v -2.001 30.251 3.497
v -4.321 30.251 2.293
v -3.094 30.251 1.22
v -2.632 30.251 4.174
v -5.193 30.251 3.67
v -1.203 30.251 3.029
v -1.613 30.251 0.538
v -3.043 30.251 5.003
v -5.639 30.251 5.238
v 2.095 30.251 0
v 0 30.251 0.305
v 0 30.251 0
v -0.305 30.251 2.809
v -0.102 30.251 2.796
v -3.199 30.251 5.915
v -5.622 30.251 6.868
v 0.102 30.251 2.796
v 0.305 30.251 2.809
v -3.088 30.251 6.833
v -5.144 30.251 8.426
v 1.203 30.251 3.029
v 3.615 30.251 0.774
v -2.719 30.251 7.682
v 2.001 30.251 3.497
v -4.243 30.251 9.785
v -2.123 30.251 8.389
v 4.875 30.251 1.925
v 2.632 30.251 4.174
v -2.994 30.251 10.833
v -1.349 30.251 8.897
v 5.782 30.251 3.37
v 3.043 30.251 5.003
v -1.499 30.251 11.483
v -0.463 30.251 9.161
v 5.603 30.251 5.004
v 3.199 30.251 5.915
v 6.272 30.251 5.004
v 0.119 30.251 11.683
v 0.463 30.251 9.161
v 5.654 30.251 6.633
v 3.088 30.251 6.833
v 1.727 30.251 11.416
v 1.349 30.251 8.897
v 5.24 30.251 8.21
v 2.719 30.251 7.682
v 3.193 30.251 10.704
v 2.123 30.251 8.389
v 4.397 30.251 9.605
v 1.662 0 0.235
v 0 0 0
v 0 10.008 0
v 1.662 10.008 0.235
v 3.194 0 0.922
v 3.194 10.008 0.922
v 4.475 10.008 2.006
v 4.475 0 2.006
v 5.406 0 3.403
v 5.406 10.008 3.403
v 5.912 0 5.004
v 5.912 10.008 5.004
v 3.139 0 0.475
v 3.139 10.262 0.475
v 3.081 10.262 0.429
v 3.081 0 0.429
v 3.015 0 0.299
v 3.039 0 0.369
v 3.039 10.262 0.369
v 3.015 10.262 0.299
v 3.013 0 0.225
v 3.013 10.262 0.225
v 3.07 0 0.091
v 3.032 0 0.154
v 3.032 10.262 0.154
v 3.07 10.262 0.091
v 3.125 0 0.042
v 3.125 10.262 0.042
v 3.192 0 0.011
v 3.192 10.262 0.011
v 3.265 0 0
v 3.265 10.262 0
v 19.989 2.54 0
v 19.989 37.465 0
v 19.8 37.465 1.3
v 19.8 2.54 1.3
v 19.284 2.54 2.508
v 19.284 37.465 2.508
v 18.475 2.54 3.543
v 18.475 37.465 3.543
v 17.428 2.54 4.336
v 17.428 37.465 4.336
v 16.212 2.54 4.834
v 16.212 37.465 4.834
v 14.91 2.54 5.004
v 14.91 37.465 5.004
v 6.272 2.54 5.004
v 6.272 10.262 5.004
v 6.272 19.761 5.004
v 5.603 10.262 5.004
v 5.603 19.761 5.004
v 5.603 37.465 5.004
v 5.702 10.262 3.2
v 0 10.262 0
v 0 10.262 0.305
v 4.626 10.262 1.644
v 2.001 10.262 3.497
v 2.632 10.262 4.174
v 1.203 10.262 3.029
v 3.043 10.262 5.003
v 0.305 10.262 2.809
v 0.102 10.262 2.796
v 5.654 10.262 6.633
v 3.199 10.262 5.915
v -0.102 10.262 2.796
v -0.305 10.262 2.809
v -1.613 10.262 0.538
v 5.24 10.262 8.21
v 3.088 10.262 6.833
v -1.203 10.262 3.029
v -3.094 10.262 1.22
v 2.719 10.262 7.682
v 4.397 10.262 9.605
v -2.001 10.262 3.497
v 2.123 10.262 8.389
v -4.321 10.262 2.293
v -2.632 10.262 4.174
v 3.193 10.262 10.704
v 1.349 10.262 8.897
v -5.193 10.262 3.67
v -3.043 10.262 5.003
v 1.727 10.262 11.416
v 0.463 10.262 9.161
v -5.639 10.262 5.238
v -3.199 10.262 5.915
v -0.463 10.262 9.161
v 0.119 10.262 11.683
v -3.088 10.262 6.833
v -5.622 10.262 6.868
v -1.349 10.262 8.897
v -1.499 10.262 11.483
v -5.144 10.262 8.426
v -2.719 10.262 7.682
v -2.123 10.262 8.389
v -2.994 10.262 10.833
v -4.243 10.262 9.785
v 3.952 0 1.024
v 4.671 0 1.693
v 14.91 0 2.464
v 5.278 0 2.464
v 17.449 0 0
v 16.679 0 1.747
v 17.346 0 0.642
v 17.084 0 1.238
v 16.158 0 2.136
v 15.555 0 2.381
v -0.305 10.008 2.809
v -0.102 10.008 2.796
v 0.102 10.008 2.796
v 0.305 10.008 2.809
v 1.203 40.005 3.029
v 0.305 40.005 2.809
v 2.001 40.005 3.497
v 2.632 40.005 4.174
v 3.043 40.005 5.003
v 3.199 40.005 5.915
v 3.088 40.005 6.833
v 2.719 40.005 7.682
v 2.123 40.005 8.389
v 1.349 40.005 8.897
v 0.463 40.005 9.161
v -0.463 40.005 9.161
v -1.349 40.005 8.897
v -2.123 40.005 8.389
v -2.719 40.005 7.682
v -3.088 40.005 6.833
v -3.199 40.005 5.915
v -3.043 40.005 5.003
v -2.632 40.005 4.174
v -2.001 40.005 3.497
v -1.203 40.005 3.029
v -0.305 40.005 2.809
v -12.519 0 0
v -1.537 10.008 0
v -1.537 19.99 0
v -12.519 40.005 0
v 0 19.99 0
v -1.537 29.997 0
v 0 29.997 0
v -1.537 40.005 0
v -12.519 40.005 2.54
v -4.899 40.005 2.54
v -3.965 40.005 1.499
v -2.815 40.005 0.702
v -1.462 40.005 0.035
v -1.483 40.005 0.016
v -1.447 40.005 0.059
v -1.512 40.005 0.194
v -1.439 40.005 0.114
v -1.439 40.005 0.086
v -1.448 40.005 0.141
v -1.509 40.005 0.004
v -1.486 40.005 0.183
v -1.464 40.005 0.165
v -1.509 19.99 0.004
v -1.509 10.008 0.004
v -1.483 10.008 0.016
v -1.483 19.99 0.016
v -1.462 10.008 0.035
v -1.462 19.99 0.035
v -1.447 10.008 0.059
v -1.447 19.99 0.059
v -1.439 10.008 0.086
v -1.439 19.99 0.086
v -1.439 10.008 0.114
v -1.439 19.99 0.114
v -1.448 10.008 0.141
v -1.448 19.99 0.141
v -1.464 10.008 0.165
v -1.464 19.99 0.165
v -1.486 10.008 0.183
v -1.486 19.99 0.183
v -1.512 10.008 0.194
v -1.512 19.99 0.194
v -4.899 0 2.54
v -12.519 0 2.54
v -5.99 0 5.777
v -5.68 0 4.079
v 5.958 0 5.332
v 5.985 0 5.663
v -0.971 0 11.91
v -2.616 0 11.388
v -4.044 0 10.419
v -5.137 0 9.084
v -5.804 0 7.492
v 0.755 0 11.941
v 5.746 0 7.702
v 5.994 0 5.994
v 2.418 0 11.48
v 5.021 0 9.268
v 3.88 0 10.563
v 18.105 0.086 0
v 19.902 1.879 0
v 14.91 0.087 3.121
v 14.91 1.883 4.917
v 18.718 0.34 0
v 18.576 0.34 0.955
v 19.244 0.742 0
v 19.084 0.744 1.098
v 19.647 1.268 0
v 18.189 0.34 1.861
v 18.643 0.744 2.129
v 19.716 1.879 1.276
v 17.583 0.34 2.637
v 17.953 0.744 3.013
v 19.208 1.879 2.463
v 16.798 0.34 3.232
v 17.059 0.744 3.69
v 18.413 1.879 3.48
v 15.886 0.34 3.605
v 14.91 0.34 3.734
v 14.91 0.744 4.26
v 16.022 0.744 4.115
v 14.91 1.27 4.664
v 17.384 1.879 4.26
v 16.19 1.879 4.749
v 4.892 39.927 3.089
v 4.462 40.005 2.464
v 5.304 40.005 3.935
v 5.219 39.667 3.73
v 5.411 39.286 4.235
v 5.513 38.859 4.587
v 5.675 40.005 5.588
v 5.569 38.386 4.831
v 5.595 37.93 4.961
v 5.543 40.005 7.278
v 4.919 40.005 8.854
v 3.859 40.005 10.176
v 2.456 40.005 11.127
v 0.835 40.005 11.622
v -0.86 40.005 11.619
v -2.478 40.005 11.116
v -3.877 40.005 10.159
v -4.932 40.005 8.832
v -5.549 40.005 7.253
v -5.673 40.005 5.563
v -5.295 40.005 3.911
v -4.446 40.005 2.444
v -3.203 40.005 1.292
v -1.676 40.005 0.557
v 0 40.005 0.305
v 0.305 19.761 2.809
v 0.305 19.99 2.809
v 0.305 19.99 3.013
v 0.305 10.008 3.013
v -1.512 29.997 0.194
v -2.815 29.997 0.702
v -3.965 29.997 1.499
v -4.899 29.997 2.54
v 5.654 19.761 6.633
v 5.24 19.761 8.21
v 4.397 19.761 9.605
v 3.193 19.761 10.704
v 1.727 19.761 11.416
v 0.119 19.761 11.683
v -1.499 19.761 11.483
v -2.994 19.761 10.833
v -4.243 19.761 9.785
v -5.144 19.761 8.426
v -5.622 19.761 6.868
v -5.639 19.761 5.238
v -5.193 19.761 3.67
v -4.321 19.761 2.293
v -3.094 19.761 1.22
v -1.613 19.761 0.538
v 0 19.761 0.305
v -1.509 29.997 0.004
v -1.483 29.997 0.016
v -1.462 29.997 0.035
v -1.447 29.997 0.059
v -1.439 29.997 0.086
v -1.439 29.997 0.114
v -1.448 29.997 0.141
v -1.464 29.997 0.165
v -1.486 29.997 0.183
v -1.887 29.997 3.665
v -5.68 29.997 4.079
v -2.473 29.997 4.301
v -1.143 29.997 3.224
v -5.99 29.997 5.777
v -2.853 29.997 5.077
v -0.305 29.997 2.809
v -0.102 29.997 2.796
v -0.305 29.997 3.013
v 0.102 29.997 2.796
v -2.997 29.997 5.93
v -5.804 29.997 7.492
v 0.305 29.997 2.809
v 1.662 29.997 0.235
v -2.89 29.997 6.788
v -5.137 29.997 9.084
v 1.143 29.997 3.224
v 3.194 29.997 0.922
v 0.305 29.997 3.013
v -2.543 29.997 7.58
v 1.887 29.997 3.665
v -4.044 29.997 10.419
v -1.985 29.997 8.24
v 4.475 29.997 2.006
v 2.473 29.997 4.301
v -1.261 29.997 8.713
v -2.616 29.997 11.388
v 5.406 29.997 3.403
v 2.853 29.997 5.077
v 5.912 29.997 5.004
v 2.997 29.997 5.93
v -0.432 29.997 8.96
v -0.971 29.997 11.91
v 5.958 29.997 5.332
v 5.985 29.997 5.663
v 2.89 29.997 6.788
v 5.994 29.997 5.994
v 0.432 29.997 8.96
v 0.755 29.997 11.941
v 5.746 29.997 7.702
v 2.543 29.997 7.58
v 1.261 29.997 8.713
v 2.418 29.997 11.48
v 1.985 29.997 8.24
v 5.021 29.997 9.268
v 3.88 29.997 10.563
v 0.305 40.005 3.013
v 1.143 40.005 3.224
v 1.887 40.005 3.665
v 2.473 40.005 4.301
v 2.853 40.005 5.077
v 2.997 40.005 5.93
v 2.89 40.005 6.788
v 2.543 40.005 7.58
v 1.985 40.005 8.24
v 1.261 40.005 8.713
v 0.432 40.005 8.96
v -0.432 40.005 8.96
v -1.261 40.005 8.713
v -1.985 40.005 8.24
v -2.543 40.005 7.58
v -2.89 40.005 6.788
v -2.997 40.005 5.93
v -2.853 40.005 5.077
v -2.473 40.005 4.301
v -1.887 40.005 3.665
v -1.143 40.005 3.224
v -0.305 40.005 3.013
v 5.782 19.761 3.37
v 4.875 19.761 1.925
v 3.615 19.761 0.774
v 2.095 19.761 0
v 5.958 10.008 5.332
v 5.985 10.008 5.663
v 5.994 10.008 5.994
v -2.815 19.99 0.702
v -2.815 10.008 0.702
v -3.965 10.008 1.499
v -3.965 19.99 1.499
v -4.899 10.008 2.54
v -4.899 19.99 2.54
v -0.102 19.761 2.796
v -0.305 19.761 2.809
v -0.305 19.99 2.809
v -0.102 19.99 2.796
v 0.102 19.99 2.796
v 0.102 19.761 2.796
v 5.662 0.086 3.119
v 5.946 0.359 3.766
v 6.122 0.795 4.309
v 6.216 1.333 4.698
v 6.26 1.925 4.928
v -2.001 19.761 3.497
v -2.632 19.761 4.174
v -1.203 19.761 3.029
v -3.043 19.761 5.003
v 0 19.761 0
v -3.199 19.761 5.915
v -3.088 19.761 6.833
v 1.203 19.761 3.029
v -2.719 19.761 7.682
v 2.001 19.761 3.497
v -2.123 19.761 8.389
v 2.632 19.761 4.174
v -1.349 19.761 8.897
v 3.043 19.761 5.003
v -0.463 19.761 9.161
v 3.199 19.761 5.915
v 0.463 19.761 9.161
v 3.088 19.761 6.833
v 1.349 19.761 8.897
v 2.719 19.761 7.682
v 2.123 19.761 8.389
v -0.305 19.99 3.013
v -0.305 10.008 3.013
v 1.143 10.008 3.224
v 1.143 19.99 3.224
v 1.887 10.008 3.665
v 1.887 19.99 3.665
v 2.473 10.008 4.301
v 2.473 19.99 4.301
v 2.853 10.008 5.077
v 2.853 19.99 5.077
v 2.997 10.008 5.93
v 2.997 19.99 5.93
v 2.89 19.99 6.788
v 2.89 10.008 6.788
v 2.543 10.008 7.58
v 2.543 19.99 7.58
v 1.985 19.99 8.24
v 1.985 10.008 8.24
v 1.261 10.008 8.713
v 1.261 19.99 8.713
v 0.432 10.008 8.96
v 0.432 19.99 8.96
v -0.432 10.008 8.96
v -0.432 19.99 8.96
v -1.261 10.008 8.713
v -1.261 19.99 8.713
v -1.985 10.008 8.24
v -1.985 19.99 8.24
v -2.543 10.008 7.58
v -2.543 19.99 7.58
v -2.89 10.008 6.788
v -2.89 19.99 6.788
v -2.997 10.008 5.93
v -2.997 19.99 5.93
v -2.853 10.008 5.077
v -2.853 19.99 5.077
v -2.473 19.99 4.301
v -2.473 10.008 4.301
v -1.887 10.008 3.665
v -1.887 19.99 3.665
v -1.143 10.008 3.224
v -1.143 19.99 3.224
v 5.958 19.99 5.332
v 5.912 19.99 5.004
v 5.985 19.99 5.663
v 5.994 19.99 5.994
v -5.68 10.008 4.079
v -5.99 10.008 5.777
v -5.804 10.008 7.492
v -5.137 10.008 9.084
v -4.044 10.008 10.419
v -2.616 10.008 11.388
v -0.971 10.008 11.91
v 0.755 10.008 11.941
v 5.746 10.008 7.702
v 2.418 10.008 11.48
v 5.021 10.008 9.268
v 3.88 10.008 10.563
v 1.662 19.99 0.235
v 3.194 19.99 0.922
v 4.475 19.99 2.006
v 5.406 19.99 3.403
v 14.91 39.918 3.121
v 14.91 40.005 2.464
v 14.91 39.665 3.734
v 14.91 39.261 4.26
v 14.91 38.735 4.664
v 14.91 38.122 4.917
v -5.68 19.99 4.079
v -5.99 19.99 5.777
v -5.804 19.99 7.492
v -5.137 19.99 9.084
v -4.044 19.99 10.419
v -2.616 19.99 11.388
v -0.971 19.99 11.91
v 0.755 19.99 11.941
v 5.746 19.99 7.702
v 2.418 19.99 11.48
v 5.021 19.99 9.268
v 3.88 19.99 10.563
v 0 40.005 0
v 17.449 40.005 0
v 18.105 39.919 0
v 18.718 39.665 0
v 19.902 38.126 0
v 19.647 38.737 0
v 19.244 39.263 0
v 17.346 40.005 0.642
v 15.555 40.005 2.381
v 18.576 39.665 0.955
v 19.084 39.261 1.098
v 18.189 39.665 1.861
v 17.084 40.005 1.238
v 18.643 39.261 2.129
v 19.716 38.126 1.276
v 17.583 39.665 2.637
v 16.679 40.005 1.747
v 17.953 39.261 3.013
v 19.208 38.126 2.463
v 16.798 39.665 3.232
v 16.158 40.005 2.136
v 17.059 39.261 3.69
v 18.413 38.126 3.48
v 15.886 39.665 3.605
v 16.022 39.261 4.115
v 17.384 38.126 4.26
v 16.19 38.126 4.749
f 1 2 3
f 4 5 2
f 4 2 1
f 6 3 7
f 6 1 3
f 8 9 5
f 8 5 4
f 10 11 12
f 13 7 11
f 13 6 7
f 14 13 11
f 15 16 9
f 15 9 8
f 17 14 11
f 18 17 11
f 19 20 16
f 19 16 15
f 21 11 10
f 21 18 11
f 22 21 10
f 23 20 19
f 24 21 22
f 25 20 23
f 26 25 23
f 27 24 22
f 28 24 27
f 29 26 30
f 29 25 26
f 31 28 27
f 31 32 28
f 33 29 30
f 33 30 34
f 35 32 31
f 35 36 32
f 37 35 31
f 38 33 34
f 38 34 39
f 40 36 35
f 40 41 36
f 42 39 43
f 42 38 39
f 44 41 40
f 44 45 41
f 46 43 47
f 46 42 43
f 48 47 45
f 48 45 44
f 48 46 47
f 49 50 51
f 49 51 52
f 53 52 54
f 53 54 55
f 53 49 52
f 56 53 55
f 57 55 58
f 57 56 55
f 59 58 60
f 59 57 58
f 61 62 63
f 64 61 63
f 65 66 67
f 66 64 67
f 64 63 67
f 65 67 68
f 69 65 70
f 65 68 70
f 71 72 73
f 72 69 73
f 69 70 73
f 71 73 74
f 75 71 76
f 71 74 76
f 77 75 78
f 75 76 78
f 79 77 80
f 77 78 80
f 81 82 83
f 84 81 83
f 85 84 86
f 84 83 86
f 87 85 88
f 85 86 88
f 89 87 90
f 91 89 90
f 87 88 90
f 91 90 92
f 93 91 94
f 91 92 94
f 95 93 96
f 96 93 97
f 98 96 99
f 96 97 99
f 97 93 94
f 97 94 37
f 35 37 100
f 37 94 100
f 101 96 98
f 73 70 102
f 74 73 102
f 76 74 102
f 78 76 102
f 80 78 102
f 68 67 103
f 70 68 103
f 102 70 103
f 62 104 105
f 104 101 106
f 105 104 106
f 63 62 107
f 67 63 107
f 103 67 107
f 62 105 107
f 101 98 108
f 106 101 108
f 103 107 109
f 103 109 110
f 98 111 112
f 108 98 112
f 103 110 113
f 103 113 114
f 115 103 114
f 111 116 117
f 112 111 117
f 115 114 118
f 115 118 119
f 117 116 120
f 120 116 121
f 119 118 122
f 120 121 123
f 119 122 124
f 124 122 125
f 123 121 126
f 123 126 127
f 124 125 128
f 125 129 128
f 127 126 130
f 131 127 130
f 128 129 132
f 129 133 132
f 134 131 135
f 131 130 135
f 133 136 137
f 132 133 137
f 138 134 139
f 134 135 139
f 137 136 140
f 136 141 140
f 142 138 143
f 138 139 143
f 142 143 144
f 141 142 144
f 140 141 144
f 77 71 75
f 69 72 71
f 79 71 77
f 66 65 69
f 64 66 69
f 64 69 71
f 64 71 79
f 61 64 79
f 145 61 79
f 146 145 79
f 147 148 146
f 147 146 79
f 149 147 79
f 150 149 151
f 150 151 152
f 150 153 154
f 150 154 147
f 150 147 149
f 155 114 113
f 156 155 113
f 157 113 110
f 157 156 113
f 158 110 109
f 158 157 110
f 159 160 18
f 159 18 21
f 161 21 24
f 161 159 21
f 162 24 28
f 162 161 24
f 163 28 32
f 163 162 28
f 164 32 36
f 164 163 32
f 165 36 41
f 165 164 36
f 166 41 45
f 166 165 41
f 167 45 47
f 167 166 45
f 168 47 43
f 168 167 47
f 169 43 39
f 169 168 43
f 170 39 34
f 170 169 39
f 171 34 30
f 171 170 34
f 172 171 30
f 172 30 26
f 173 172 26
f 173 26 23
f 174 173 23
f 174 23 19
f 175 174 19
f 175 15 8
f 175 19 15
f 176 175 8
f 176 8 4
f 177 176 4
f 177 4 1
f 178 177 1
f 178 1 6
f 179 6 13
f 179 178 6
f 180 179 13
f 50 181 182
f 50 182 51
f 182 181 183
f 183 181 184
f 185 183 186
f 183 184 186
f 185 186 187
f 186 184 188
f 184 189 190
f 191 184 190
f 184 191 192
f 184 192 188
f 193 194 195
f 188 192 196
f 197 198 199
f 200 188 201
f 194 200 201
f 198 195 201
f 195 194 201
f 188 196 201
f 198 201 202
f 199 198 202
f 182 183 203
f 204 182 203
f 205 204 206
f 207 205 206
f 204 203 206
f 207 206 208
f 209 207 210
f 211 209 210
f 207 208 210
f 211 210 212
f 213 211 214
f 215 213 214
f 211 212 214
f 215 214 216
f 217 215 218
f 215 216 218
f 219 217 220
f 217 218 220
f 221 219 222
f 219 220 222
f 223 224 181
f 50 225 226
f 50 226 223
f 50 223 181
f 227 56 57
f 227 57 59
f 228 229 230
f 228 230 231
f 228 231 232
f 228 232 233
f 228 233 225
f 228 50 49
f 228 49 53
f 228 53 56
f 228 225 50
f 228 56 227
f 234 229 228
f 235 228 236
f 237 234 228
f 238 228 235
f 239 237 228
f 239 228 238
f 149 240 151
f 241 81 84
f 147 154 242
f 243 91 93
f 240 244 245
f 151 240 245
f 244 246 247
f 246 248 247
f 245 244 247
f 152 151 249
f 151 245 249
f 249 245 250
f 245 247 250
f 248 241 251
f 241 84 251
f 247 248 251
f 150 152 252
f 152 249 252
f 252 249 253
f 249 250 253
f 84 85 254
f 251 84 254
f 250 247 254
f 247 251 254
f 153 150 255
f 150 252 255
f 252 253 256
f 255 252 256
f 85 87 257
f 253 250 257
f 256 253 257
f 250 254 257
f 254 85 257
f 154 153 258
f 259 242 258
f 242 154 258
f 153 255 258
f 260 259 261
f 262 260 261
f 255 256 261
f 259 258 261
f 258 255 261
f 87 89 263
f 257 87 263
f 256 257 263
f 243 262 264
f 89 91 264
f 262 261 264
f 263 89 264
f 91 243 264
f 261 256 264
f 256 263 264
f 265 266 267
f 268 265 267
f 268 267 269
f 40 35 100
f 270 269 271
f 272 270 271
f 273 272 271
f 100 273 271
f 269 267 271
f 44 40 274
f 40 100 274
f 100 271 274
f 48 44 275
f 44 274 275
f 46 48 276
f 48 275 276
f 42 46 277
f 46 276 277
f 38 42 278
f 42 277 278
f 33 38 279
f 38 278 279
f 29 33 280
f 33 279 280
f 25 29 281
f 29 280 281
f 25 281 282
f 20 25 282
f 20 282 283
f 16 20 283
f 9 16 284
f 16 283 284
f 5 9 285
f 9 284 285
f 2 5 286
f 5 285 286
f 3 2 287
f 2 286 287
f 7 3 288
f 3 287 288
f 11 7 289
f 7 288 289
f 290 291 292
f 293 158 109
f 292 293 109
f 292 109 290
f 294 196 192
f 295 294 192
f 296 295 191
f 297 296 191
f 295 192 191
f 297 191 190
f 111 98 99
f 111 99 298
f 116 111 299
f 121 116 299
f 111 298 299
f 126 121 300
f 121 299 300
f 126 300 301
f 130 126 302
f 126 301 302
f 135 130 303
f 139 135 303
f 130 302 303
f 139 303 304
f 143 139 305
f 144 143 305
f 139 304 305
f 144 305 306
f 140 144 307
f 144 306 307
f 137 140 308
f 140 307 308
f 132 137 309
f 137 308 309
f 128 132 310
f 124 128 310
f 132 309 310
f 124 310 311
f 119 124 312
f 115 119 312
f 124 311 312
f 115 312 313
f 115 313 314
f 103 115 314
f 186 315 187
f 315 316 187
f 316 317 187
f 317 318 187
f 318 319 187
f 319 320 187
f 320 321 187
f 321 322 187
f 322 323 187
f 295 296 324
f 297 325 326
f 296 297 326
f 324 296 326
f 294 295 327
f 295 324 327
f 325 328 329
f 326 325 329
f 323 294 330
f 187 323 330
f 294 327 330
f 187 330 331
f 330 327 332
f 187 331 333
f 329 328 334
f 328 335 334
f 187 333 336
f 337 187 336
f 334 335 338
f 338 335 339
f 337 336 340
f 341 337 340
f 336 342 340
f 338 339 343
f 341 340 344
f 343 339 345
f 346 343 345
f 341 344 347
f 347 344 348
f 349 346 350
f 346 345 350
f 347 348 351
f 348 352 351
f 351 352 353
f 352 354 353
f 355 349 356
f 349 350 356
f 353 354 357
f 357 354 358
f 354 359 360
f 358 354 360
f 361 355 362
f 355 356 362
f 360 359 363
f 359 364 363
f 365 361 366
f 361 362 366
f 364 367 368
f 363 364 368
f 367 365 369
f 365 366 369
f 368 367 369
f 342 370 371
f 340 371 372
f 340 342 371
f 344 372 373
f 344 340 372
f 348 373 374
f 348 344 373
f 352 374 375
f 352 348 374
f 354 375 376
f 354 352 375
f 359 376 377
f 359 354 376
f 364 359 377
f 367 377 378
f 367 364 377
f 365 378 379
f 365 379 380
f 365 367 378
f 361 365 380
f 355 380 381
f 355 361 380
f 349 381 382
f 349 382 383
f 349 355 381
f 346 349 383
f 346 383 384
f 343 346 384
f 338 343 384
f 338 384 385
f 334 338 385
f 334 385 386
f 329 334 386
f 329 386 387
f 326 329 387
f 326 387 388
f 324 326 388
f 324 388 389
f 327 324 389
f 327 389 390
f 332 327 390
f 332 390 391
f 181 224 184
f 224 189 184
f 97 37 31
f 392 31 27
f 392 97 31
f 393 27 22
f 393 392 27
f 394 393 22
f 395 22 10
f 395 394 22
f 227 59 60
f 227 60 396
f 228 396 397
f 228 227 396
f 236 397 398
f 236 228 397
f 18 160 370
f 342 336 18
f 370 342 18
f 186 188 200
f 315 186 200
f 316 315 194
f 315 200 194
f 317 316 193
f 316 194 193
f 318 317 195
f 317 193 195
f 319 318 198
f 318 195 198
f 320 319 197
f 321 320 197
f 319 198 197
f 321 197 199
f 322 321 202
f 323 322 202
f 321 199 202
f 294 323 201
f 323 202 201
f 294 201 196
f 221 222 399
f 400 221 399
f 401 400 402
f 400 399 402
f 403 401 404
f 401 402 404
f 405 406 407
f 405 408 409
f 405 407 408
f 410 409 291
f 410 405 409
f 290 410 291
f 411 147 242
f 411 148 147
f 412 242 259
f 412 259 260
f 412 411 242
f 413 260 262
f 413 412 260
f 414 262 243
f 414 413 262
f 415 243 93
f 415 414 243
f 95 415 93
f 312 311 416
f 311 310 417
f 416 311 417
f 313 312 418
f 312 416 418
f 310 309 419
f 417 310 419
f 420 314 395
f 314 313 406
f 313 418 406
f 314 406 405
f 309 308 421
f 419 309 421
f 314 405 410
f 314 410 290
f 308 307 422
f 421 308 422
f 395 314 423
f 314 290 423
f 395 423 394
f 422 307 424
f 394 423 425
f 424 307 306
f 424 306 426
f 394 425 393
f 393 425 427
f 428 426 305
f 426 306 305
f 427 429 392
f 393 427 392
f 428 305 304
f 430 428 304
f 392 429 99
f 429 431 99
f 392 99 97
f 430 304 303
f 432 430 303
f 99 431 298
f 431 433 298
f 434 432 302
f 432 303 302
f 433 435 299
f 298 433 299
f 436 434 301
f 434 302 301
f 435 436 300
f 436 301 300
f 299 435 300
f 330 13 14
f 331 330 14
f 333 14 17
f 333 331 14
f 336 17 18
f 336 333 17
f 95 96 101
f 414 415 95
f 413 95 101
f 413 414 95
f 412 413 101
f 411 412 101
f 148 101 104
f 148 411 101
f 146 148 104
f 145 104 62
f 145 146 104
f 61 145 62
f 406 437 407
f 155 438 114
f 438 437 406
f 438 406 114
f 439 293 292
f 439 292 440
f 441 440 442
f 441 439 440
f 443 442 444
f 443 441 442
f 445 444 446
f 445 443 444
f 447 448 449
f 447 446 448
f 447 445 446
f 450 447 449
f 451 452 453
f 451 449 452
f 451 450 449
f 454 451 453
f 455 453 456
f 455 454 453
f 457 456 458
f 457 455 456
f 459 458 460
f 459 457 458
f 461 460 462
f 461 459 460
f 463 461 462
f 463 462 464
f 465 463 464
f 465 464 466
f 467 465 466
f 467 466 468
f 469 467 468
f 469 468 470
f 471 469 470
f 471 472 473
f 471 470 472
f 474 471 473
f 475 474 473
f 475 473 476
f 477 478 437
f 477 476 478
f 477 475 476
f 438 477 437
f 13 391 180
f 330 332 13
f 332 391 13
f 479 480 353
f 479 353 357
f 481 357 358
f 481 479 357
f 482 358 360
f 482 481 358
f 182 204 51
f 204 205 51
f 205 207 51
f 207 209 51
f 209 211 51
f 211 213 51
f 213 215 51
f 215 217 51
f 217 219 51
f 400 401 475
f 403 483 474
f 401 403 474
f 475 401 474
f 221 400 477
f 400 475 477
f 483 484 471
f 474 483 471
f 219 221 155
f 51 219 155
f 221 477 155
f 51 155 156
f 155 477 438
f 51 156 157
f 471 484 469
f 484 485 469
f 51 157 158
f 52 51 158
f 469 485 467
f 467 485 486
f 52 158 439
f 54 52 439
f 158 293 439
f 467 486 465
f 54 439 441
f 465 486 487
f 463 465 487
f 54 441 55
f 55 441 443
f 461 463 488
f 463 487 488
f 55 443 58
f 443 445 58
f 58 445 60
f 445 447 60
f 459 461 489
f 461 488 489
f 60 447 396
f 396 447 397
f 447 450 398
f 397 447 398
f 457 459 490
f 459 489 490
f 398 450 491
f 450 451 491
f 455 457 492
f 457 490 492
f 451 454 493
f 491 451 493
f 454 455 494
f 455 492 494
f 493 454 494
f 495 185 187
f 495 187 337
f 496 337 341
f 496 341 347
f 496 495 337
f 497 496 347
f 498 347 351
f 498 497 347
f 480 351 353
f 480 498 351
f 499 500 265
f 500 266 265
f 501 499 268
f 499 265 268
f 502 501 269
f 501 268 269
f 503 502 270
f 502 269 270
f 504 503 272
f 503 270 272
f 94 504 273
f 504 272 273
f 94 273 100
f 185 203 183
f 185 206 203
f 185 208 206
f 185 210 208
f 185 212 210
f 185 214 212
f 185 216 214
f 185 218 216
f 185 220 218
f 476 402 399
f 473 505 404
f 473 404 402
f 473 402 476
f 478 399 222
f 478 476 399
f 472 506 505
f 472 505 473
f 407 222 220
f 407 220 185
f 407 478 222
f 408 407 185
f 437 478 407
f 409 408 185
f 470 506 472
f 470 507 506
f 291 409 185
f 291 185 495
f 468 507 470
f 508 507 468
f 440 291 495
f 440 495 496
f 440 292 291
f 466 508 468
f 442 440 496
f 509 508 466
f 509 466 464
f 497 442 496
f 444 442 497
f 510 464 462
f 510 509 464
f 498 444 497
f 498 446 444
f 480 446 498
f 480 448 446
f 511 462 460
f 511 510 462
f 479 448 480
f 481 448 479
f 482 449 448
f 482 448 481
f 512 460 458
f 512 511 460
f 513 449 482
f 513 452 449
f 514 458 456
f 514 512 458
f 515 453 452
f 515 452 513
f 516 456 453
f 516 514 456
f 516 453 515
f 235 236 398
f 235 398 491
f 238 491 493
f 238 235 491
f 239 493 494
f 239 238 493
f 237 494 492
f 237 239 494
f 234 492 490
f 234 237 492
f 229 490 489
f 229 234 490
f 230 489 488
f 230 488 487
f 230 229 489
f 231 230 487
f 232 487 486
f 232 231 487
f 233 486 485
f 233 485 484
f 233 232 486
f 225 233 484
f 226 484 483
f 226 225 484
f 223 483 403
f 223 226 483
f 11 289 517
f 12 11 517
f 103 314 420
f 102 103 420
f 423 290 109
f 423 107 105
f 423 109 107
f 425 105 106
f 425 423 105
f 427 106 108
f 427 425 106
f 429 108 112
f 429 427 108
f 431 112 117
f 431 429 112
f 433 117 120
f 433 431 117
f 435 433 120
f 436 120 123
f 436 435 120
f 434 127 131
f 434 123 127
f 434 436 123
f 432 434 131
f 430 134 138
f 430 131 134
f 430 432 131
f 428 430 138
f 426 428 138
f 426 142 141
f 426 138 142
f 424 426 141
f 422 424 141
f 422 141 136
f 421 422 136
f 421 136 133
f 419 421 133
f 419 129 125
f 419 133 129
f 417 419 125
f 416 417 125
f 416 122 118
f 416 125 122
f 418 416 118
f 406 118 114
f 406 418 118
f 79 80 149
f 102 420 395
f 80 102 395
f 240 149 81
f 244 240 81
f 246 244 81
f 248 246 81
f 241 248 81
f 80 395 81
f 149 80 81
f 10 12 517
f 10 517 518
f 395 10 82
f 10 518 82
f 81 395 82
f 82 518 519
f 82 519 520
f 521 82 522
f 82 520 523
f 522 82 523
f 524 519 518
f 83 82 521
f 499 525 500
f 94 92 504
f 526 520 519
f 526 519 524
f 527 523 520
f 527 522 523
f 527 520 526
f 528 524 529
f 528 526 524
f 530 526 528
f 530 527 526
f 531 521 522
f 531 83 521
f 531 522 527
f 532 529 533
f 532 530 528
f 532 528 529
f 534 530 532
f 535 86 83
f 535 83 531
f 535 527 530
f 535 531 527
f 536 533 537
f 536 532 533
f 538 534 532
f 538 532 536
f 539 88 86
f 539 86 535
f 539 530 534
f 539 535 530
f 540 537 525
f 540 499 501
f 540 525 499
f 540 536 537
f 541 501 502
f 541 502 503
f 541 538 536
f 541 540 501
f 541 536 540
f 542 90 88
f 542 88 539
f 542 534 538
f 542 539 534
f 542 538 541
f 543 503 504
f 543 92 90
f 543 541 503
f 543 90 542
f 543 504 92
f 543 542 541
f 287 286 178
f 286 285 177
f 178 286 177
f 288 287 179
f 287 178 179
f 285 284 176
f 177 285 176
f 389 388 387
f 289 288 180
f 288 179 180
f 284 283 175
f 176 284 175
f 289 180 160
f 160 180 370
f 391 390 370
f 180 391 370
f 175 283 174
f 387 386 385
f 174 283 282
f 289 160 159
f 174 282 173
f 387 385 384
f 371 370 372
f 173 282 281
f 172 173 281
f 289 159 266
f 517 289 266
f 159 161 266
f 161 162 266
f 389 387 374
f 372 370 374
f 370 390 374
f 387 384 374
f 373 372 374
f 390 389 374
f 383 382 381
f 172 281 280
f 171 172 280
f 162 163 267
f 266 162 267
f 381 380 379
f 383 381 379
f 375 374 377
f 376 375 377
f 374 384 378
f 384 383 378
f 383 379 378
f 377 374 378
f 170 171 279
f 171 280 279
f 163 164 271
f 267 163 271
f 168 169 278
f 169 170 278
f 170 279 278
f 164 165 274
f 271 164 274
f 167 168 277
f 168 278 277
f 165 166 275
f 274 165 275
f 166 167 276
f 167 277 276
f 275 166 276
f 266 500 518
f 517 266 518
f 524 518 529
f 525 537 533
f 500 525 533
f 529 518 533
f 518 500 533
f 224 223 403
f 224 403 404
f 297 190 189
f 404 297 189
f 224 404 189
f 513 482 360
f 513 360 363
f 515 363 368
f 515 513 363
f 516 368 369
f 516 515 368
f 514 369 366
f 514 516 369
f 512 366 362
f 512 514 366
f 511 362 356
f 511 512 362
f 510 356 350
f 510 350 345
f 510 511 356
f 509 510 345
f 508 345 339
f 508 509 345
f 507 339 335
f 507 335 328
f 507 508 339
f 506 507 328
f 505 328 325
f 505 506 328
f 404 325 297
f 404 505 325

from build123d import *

# Parameters (mm, degrees)
F3_DEPTH     = 10.0076
F4_DEPTH     = 40.005
F6_START     = -19.9898
F6_DEPTH     = 10.0076
F7_DEPTH     = 10.0076
F9_START     = 20.2438
F2_R         = 3.2004
F9_DEPTH     = 9.4996
F10_DEPTH    = 10.2616
F11_START    = 20.0152
F11_DEPTH    = 9.9822
F12_START    = -19.7612
F12_DEPTH    = 11.6078
F13_DEPTH    = 9.7536
F14_T1_DEPTH = 13.1863686745
F15_T1_DEPTH = 65.405
F16_R        = 2.54


# Not quite as in the source:
# - a fillet or chamfer that OpenCascade refuses, or shapes differently, is made with other operations: its cross-section is extruded or revolved along the edge and cut away or added


with BuildPart() as f3:
    # F0 (on Front) → F3 (new body)
    with BuildSketch(Plane.XZ):
        with BuildLine():
            ThreePointArc((-4.8989745866, 2.54), (-2.7591462448, 0.6727514434), (0, 0))
            ThreePointArc((0, 0), (3.8726462994, 1.4188735822), (5.9119830007, 5.0038))
            ThreePointArc((5.9119830007, 5.0038), (5.9737602169, 5.4973887019), (5.9944, 5.9944))
            ThreePointArc((5.9944, 5.9944), (-1.8119627615, 11.7083848014), (-4.8989745866, 2.54))
        make_face()
        with BuildLine():
            ThreePointArc((-0.3048, 3.0127385839), (0, 8.9916), (0.3048, 3.0127385839))
            Line((0.3048, 3.0127385839), (0.3048, 2.808547348))
            ThreePointArc((0.3048, 2.808547348), (0, 2.794), (-0.3048, 2.808547348))
            Line((-0.3048, 2.808547348), (-0.3048, 3.0127385839))
        make_face(mode=Mode.SUBTRACT)
        with BuildLine():
            Line((-12.5189745866, 0), (0, 0))
            ThreePointArc((0, 0), (-2.7591462448, 0.6727514434), (-4.8989745866, 2.54))
            Line((-4.8989745866, 2.54), (-12.5189745866, 2.54))
            Line((-12.5189745866, 2.54), (-12.5189745866, 0))
        make_face()
    extrude(amount=-F3_DEPTH)

    # F0 (on Front) → F4 (join)
    with BuildSketch(Plane.XZ):
        with BuildLine():
            Line((0.3048, 2.808547348), (0.3048, 3.0127385839))
            ThreePointArc((0.3048, 3.0127385839), (0, 8.9916), (-0.3048, 3.0127385839))
            Line((-0.3048, 3.0127385839), (-0.3048, 2.808547348))
            ThreePointArc((-0.3048, 2.808547348), (0, 2.794), (0.3048, 2.808547348))
        make_face()
    extrude(amount=-F4_DEPTH)

    # F0 (on Front) → F6 (join)
    with BuildSketch(Plane.XZ.offset(F6_START)):
        with BuildLine():
            ThreePointArc((-4.8989745866, 2.54), (-2.7591462448, 0.6727514434), (0, 0))
            ThreePointArc((0, 0), (3.8726462994, 1.4188735822), (5.9119830007, 5.0038))
            ThreePointArc((5.9119830007, 5.0038), (5.9737602169, 5.4973887019), (5.9944, 5.9944))
            ThreePointArc((5.9944, 5.9944), (-1.8119627615, 11.7083848014), (-4.8989745866, 2.54))
        make_face()
        with BuildLine():
            ThreePointArc((-0.3048, 3.0127385839), (0, 8.9916), (0.3048, 3.0127385839))
            Line((0.3048, 3.0127385839), (0.3048, 2.808547348))
            ThreePointArc((0.3048, 2.808547348), (0, 2.794), (-0.3048, 2.808547348))
            Line((-0.3048, 2.808547348), (-0.3048, 3.0127385839))
        make_face(mode=Mode.SUBTRACT)
        with BuildLine():
            Line((-12.5189745866, 0), (0, 0))
            ThreePointArc((0, 0), (-2.7591462448, 0.6727514434), (-4.8989745866, 2.54))
            Line((-4.8989745866, 2.54), (-12.5189745866, 2.54))
            Line((-12.5189745866, 2.54), (-12.5189745866, 0))
        make_face()
    extrude(amount=-F6_DEPTH)

    # F2 (on offset) → F7 (join)
    with BuildSketch(Plane.XZ.offset(-40.005)):
        with BuildLine():
            ThreePointArc((-1.5118372742, 0.1937811178), (-3.4133287183, 1.0667211934), (-4.8989745866, 2.54))
            Line((-4.8989745866, 2.54), (-12.5189745866, 2.54))
            Line((-12.5189745866, 2.54), (-12.5189745866, 0))
            Line((-12.5189745866, 0), (-1.5366753453, 0))
            ThreePointArc((-1.5366753453, 0), (-1.4389921182, 0.0859617436), (-1.5118372742, 0.1937811178))
        make_face()
    extrude(amount=F7_DEPTH)

    # F2 (on offset) → F9 (join)
    with BuildSketch(Plane.XZ.offset(-40.005).offset(F9_START)):
        with BuildLine():
            Line((0, 0.3048), (0, 0))
            ThreePointArc((0, 0), (3.8726462994, 1.4188735822), (5.9119830007, 5.0038))
            Line((5.9119830007, 5.0038), (5.6027011164, 5.0038))
            ThreePointArc((5.6027011164, 5.0038), (-3.6561886166, 10.353738592), (0, 0.3048))
        make_face()
        with Locations((0, 5.9944)):
            Circle(F2_R, mode=Mode.SUBTRACT)
        with BuildLine():
            ThreePointArc((5.9119830007, 5.0038), (3.8726462994, 1.4188735822), (0, 0))
            Line((0, 0), (19.9898, 0))
            Line((19.9898, 0), (19.9898, 5.0038))
            Line((19.9898, 5.0038), (5.9119830007, 5.0038))
        make_face()
    extrude(amount=F9_DEPTH)

    # F0 (on Front) → F10 (join)
    with BuildSketch(Plane.XZ):
        with BuildLine():
            ThreePointArc((6.2722573002, 5.0038), (4.8747199854, 1.9250505355), (2.0951536077, 0))
            Line((2.0951536077, 0), (19.9898, 0))
            Line((19.9898, 0), (19.9898, 5.0038))
            Line((19.9898, 5.0038), (6.2722573002, 5.0038))
        make_face()
    extrude(amount=-F10_DEPTH)

    # F2 (on offset) → F11 (join)
    with BuildSketch(Plane.XZ.offset(-40.005).offset(F11_START)):
        with BuildLine():
            ThreePointArc((-1.5118372742, 0.1937811178), (-3.4133287183, 1.0667211934), (-4.8989745866, 2.54))
            Line((-4.8989745866, 2.54), (-12.5189745866, 2.54))
            Line((-12.5189745866, 2.54), (-12.5189745866, 0))
            Line((-12.5189745866, 0), (-1.5366753453, 0))
            ThreePointArc((-1.5366753453, 0), (-1.4389921182, 0.0859617436), (-1.5118372742, 0.1937811178))
        make_face()
    extrude(amount=F11_DEPTH)

    # F0 (on Front) → F12 (join)
    with BuildSketch(Plane.XZ.offset(F12_START)):
        with BuildLine():
            ThreePointArc((6.2722573002, 5.0038), (4.8747199854, 1.9250505355), (2.0951536077, 0))
            Line((2.0951536077, 0), (19.9898, 0))
            Line((19.9898, 0), (19.9898, 5.0038))
            Line((19.9898, 5.0038), (6.2722573002, 5.0038))
        make_face()
    extrude(amount=-F12_DEPTH)

    # F2 (on offset) → F13 (join)
    with BuildSketch(Plane.XZ.offset(-40.005)):
        with BuildLine():
            ThreePointArc((5.9119830007, 5.0038), (3.8726462994, 1.4188735822), (0, 0))
            Line((0, 0), (19.9898, 0))
            Line((19.9898, 0), (19.9898, 5.0038))
            Line((19.9898, 5.0038), (5.9119830007, 5.0038))
        make_face()
        with BuildLine():
            Line((0, 0.3048), (0, 0))
            ThreePointArc((0, 0), (3.8726462994, 1.4188735822), (5.9119830007, 5.0038))
            Line((5.9119830007, 5.0038), (5.6027011164, 5.0038))
            ThreePointArc((5.6027011164, 5.0038), (-3.6561886166, 10.353738592), (0, 0.3048))
        make_face()
        with Locations((0, 5.9944)):
            Circle(F2_R, mode=Mode.SUBTRACT)
    extrude(amount=F13_DEPTH)

    # F14: fillet of radius 0.254 on 1 edges, made by hand

    # F14_s2 → F14_t1 (cut)
    with BuildSketch(Plane.XZ.offset(-10.2616)):
        with BuildLine():
            ThreePointArc((3.1394818053, 0.4747846154), (3.0195052872, 0.1890511444), (3.2650610775, 0))
            Line((3.2650610775, 0), (2.0951536077, 0))
            ThreePointArc((2.0951536077, 0), (2.628061469, 0.2137605098), (3.1394818053, 0.4747846154))
        make_face()
    extrude(amount=F14_T1_DEPTH, mode=Mode.SUBTRACT)

    # F15: fillet of radius 5.08 on 1 edges, made by hand

    # F15_s2 → F15_t1 (cut)
    with BuildSketch(Plane.XZ.offset(-52.705)):
        with BuildLine():
            ThreePointArc((19.9898, -0.0762), (18.5019024484, 3.5159024484), (14.9098, 5.0038))
            Line((14.9098, 5.0038), (19.9898, 5.0038))
            Line((19.9898, 5.0038), (19.9898, -0.0762))
        make_face()
    extrude(amount=F15_T1_DEPTH, mode=Mode.SUBTRACT)

    # F16
    f16_edges = [f3.edges().sort_by_distance(p)[0] for p in [
        (10.256251, 40.005, 5.0038),
        (10.591029, 0, 5.0038),
        (18.47486, 40.005, 3.542743),
        (18.47486, 0, 3.542743),
    ]]
    fillet(f16_edges, radius=F16_R)


solid = f3.part
